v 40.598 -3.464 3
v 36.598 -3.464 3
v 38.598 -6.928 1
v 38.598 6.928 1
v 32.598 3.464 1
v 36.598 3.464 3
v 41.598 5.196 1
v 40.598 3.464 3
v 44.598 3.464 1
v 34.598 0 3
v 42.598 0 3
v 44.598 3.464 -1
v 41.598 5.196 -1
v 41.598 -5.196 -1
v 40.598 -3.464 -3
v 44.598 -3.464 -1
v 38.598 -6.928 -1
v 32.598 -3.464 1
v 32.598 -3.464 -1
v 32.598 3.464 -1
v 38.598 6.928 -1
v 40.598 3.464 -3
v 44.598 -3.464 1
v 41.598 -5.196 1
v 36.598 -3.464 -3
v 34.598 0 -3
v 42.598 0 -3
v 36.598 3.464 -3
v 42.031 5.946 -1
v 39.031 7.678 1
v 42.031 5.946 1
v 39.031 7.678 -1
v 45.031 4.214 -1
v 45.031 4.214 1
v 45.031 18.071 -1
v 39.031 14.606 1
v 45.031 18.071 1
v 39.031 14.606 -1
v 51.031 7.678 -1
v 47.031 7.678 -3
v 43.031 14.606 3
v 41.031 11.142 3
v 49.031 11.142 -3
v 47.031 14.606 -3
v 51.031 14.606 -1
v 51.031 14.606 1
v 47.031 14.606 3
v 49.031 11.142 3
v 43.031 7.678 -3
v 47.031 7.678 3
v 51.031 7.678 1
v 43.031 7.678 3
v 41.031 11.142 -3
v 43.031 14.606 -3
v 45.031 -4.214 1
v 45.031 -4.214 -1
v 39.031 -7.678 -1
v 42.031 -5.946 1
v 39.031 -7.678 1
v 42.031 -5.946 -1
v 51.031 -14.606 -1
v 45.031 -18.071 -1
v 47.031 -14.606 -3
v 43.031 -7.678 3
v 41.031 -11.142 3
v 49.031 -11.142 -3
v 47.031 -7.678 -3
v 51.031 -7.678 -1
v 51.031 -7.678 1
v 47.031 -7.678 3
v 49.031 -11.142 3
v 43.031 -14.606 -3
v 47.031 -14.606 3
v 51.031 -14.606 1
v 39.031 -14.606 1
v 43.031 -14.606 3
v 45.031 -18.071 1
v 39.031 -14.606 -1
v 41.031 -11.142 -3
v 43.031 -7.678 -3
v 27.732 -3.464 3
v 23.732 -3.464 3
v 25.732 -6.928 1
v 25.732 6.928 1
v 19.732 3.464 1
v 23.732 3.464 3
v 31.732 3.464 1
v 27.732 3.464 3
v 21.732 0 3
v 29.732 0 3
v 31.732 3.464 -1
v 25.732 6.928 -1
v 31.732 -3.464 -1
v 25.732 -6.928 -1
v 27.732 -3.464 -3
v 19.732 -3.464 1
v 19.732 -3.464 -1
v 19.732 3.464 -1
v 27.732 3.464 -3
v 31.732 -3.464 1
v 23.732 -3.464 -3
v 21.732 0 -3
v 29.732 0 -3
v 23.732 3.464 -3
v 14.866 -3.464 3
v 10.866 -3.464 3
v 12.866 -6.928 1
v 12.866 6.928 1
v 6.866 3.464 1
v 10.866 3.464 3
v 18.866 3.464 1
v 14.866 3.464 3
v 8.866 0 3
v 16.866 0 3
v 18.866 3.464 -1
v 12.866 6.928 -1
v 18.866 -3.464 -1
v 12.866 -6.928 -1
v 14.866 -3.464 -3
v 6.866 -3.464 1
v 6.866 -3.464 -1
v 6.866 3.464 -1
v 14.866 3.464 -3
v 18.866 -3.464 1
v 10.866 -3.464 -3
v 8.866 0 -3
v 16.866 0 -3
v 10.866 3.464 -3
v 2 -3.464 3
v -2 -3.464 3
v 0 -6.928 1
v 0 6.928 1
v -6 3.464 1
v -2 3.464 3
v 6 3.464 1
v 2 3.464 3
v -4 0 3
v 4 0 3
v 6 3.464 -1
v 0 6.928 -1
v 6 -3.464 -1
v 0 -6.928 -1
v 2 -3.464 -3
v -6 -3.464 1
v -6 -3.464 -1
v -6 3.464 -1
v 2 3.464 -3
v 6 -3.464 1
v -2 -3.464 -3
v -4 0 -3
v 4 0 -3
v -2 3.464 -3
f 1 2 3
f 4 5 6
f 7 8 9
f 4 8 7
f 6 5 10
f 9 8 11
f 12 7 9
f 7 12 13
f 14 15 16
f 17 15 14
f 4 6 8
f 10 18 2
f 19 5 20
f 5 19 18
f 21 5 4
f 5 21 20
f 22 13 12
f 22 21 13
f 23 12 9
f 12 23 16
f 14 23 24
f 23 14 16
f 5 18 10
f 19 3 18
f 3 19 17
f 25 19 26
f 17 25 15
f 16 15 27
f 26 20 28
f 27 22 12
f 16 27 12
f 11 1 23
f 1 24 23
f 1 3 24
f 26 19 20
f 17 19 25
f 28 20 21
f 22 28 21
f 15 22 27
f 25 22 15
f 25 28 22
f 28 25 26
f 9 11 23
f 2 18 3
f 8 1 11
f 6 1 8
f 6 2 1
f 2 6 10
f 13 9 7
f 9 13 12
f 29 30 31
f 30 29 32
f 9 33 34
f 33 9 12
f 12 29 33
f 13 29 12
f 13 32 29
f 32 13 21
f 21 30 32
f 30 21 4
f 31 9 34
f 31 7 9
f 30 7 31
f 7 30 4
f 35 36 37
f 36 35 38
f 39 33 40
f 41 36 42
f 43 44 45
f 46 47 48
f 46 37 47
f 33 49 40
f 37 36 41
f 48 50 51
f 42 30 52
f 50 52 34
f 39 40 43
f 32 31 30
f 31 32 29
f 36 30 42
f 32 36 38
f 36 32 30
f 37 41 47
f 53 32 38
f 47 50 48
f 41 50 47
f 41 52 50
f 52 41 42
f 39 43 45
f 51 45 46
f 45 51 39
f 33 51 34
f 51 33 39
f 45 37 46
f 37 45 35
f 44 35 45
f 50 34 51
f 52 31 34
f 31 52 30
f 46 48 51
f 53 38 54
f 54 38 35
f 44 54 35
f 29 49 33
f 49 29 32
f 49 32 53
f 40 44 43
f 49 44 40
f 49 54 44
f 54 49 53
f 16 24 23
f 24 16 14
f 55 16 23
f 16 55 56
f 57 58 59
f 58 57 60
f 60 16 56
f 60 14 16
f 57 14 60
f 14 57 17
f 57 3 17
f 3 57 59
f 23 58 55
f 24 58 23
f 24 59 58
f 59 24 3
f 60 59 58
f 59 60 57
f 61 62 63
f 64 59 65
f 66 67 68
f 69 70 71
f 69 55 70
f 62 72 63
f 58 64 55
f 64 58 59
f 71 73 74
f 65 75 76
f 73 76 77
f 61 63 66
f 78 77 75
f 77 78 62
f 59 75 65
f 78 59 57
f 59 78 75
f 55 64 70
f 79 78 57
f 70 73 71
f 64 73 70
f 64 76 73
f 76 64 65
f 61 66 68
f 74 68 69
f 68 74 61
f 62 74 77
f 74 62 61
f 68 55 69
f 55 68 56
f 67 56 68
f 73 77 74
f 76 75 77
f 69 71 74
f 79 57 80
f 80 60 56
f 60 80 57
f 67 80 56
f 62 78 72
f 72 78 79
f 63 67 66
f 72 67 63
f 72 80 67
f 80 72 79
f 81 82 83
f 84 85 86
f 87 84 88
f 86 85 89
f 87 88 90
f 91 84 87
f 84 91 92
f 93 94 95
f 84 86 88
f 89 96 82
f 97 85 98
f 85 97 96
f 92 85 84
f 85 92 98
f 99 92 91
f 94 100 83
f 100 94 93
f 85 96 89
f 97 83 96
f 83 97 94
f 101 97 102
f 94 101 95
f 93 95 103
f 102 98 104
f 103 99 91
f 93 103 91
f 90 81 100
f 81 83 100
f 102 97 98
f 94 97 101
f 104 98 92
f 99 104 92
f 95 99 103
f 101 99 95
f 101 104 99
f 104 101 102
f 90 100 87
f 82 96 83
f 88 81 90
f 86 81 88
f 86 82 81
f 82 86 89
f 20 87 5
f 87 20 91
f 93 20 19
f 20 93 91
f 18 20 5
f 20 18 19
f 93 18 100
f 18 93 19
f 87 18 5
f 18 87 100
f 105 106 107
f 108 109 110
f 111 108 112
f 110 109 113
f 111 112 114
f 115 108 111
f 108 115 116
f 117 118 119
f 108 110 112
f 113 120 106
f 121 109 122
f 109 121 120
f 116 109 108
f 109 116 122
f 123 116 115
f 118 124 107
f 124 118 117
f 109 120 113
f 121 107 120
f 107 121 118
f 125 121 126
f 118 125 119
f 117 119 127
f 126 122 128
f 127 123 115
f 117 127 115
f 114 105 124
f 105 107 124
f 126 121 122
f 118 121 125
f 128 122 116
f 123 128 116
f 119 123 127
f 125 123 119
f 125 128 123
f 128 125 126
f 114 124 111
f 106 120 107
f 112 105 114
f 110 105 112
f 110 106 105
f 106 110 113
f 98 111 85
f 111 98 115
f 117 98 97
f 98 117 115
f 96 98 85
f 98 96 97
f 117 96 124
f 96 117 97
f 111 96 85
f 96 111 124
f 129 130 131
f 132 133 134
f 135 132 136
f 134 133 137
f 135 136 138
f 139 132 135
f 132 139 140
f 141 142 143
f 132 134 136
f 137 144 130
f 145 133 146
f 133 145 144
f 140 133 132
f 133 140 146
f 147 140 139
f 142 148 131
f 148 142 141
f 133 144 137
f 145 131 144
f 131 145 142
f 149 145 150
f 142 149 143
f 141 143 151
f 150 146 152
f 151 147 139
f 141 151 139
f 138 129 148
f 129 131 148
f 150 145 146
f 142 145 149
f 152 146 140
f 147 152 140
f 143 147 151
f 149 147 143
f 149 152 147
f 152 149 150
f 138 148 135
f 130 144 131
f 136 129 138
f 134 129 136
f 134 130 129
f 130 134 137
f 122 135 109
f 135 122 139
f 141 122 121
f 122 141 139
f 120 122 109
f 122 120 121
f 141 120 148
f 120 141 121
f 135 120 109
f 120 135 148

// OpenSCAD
// file: gem-common.scad
angles = [for(i = [0:5]) i * (360 / 6)];

inner_poly_radius=8 * cos(60);
outer_poly_radius=8 * cos(30);
outer_poly_z=1;
inner_poly_z=3;


gap_between_gems = cos(30);
distance_to_corner = cos(30) * outer_poly_radius * 2 + gap_between_gems;


module edge_connector(angle = 0) {
    function make_point_2d(r, angle, height) = [r * sin(angle), height];
    
    points = [
        make_point_2d(outer_poly_radius, 30, outer_poly_z),
        make_point_2d(outer_poly_radius, -30, outer_poly_z),
        make_point_2d(outer_poly_radius, -30, -outer_poly_z),
        make_point_2d(outer_poly_radius, 30, -outer_poly_z),
    ];
    
    rotate([0,0,angle]) {
        translate([(distance_to_corner - gap_between_gems) / 2,0,0]){
            rotate([90, 0, 90]) {
                linear_extrude(gap_between_gems) {
                    polygon(points);
                }
            }
        }
    }
}

module move(distance, angle) {
    translate([distance * cos(angle), distance * sin(angle), 0]) {
        children();
    }
}


module corner_connector(angle=0) {
    r = 0.5;
    rotate_angle = angle + 30;
    move(outer_poly_radius + r, rotate_angle) {
        translate([0,0, -outer_poly_z]) {
            rotate([0,0,-rotate_angle]) {
                cylinder($fn=3, r=r, h=outer_poly_z * 2);
            }
        }
    }
}

module gem() {
    function make_point(r, angle, height) = [r * cos(angle), r * sin(angle), height];
    
    top_poly = [for(th = angles) make_point(inner_poly_radius, th, inner_poly_z)];
    top_outer_poly = [for(th = angles) make_point(outer_poly_radius, th + 30, outer_poly_z)];
    bottom_outer_poly = [for(th = angles) make_point(outer_poly_radius, th + 30, -outer_poly_z)];
    bottom_poly = [for(th = angles) make_point(inner_poly_radius, th, -inner_poly_z)];
 
    function rot(n, base) = (n + 1 - base) % 6 + base;
    
    faces = [
        [5, 4, 3, 2, 1, 0],
        for(i = [0:5]) [i, (i + 1) % 6, i + 6],
        for(i = [6:11]) [i, (i - 5) % 6, rot(i, 6)],
        for(i = [6:11]) [i, rot(i, 6), rot(i, 6) + 6, i + 6],
        for(i = [12:17]) [i, rot(i, 12), rot(i, 12) + 6],
        for(i = [18:23]) [i, i-6, rot(i, 18)],
        [18, 19, 20, 21, 22, 23],
    ];
    
    polyhedron(
        concat(
            top_poly,
            top_outer_poly,
            bottom_outer_poly,
            bottom_poly
        ),
        faces
    );
}
// main file
include <./gem-common.scad>

gem();
edge_connector();
move(distance_to_corner, 0) {
    gem();
    edge_connector();
    move(distance_to_corner, 0) {
        gem();
        edge_connector();
        move(distance_to_corner, 0) {
            gem();
            edge_connector(60);
            move(distance_to_corner, 60) {
                gem();
            }
            edge_connector(-60);
            move(distance_to_corner, -60) {
                gem();
            }
        }
    }
}
